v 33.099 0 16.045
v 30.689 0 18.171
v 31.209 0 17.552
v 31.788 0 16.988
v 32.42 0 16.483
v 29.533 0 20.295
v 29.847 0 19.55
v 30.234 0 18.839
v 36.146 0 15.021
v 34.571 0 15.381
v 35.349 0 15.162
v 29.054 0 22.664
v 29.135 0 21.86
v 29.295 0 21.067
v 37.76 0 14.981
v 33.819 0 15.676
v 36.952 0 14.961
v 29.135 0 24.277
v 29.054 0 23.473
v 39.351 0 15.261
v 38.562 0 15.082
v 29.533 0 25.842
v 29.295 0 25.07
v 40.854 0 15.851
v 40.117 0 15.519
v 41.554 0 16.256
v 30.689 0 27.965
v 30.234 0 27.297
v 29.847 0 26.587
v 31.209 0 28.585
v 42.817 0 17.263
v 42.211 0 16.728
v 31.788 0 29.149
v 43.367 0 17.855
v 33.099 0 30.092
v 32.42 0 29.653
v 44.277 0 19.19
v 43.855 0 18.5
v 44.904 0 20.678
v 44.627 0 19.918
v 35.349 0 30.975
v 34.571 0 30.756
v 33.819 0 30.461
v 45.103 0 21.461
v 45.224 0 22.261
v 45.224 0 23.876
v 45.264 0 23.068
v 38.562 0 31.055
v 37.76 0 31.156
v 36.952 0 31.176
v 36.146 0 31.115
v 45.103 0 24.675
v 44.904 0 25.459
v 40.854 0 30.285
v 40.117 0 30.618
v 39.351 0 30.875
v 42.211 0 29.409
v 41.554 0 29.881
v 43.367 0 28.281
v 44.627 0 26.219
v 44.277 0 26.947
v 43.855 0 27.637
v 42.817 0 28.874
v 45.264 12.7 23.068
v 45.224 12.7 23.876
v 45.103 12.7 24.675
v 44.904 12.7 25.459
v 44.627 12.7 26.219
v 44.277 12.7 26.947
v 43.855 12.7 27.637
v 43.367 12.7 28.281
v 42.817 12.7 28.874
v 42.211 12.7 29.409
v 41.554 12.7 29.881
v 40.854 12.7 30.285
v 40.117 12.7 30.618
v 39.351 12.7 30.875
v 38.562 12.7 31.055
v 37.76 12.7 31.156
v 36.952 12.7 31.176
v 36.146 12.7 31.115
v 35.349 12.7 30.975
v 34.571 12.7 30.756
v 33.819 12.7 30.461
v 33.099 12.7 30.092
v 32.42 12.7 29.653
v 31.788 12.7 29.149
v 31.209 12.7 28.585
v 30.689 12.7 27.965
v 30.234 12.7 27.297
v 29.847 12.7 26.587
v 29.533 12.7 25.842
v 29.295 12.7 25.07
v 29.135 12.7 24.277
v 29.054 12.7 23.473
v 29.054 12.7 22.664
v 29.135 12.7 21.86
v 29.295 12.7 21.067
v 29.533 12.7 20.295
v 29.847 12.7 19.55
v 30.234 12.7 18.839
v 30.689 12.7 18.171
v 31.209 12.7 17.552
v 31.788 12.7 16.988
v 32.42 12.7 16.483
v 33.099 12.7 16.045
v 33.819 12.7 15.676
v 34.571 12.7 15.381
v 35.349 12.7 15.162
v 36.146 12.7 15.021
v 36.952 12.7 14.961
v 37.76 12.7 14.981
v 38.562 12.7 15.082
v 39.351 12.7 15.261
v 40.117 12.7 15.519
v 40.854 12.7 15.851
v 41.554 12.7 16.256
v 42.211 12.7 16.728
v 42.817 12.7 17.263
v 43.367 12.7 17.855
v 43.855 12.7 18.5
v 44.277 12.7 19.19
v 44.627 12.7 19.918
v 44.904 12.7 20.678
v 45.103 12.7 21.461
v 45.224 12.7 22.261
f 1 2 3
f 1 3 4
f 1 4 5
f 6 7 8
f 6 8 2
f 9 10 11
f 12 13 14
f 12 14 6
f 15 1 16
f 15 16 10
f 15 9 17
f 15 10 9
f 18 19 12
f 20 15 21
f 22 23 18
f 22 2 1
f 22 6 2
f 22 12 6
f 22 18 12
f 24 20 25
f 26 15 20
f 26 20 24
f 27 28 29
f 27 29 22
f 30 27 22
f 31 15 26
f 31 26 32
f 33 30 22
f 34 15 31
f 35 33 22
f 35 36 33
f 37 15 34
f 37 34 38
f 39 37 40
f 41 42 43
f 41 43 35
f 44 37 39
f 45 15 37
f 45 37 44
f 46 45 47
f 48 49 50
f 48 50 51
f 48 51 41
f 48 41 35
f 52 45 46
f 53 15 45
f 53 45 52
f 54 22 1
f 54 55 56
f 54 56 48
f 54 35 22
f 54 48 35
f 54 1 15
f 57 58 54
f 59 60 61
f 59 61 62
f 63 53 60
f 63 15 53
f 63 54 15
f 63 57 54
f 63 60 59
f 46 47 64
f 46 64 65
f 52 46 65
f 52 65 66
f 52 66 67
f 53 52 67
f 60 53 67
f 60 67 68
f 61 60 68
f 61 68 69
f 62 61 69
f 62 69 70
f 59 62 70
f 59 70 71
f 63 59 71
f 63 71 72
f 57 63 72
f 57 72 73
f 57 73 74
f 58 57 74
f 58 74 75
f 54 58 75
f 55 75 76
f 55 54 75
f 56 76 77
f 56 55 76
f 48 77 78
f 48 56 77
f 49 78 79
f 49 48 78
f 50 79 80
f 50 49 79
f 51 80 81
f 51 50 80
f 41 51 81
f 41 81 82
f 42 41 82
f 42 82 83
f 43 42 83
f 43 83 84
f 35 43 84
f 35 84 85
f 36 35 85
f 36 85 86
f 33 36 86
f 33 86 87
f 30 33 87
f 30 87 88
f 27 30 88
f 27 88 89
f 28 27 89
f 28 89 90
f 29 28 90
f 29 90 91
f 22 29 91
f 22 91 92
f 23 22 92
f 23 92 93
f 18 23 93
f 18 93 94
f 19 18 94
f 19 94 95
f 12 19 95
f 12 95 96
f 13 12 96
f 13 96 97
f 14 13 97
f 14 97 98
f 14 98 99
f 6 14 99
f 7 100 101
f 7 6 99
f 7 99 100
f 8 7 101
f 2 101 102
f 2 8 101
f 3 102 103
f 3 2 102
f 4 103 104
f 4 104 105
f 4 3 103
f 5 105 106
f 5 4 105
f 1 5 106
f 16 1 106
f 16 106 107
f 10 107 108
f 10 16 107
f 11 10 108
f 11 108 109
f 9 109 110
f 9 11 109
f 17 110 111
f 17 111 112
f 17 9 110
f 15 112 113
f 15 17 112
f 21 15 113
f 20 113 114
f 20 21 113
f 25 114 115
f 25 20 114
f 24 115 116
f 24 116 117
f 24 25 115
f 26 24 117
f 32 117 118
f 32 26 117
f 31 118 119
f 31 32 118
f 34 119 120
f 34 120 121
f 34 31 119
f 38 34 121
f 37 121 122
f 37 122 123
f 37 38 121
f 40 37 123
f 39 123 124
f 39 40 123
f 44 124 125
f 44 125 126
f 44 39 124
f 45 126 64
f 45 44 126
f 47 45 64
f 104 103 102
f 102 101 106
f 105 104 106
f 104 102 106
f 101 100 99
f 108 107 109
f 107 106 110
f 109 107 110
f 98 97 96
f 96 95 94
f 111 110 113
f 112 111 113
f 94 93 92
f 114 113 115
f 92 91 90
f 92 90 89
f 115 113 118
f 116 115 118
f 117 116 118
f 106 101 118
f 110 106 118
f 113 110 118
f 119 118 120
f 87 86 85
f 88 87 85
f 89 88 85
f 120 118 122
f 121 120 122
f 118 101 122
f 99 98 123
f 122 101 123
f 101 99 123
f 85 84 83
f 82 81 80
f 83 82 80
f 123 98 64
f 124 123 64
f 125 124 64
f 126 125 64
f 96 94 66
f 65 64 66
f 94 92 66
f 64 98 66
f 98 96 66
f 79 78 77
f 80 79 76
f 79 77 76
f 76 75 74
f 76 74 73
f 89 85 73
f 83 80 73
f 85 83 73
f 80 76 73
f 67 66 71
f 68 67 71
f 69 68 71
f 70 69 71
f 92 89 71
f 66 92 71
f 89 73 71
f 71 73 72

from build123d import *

# Parameters (mm, degrees)
F0_W       = 115.6759760343
F0_H       = 74.756577611
F1_DEPTH   = 12.7
F2_R       = 9.4593135563
F3_DEPTH   = 25.4
F4_W       = 115.6759760343
F4_H       = 74.756577611
F4_R       = 8.4889409242
F5_DEPTH   = 25.4
F6_R       = 8.1100294651
F1_FACE1_W = 115.6759760343
F1_FACE1_H = 74.756577611
F7_DEPTH   = 25.4


with BuildPart() as f1:
    # F0 (on Front) → F1 (new body, symmetric)
    with BuildSketch(Plane.XZ):
        with Locations((2.7541879099, 0)):
            Rectangle(F0_W, F0_H)
    extrude(amount=F1_DEPTH, both=True)

    # F2 (on face) → F3 (join)
    with BuildSketch(Plane.XZ.offset(12.7)):
        with Locations((-30.2960947156, 18.0989615619)):
            Circle(F2_R)
    extrude(amount=-F3_DEPTH)

    # F4 (on face) → F5 (join)
    with BuildSketch(Plane(origin=(0, 12.7, 0), x_dir=(-1, 0, 0), z_dir=(0, 1, 0))):
        with Locations((-2.7541879099, 0)):
            Rectangle(F4_W, F4_H)
        with Locations((-43.9671128988, 24.5215520263)):
            Circle(F4_R, mode=Mode.SUBTRACT)
        with Locations((-43.9671128988, 24.5215520263)):
            Circle(F4_R)
    extrude(amount=-F5_DEPTH)

    # F6 (on Front) + F1_face1 (on face) → F7 (intersect)
    with BuildSketch(Plane.XZ):
        with Locations((37.1541380882, 23.0683349073)):
            Circle(F6_R)
    with BuildSketch(Plane(origin=(2.7541879099, 12.7, 0), x_dir=(1, 0, 0), z_dir=(0, 1, 0))):
        Rectangle(F1_FACE1_W, F1_FACE1_H)
    extrude(amount=-F7_DEPTH, dir=(0, -1, 0), mode=Mode.INTERSECT)


solid = f1.part
